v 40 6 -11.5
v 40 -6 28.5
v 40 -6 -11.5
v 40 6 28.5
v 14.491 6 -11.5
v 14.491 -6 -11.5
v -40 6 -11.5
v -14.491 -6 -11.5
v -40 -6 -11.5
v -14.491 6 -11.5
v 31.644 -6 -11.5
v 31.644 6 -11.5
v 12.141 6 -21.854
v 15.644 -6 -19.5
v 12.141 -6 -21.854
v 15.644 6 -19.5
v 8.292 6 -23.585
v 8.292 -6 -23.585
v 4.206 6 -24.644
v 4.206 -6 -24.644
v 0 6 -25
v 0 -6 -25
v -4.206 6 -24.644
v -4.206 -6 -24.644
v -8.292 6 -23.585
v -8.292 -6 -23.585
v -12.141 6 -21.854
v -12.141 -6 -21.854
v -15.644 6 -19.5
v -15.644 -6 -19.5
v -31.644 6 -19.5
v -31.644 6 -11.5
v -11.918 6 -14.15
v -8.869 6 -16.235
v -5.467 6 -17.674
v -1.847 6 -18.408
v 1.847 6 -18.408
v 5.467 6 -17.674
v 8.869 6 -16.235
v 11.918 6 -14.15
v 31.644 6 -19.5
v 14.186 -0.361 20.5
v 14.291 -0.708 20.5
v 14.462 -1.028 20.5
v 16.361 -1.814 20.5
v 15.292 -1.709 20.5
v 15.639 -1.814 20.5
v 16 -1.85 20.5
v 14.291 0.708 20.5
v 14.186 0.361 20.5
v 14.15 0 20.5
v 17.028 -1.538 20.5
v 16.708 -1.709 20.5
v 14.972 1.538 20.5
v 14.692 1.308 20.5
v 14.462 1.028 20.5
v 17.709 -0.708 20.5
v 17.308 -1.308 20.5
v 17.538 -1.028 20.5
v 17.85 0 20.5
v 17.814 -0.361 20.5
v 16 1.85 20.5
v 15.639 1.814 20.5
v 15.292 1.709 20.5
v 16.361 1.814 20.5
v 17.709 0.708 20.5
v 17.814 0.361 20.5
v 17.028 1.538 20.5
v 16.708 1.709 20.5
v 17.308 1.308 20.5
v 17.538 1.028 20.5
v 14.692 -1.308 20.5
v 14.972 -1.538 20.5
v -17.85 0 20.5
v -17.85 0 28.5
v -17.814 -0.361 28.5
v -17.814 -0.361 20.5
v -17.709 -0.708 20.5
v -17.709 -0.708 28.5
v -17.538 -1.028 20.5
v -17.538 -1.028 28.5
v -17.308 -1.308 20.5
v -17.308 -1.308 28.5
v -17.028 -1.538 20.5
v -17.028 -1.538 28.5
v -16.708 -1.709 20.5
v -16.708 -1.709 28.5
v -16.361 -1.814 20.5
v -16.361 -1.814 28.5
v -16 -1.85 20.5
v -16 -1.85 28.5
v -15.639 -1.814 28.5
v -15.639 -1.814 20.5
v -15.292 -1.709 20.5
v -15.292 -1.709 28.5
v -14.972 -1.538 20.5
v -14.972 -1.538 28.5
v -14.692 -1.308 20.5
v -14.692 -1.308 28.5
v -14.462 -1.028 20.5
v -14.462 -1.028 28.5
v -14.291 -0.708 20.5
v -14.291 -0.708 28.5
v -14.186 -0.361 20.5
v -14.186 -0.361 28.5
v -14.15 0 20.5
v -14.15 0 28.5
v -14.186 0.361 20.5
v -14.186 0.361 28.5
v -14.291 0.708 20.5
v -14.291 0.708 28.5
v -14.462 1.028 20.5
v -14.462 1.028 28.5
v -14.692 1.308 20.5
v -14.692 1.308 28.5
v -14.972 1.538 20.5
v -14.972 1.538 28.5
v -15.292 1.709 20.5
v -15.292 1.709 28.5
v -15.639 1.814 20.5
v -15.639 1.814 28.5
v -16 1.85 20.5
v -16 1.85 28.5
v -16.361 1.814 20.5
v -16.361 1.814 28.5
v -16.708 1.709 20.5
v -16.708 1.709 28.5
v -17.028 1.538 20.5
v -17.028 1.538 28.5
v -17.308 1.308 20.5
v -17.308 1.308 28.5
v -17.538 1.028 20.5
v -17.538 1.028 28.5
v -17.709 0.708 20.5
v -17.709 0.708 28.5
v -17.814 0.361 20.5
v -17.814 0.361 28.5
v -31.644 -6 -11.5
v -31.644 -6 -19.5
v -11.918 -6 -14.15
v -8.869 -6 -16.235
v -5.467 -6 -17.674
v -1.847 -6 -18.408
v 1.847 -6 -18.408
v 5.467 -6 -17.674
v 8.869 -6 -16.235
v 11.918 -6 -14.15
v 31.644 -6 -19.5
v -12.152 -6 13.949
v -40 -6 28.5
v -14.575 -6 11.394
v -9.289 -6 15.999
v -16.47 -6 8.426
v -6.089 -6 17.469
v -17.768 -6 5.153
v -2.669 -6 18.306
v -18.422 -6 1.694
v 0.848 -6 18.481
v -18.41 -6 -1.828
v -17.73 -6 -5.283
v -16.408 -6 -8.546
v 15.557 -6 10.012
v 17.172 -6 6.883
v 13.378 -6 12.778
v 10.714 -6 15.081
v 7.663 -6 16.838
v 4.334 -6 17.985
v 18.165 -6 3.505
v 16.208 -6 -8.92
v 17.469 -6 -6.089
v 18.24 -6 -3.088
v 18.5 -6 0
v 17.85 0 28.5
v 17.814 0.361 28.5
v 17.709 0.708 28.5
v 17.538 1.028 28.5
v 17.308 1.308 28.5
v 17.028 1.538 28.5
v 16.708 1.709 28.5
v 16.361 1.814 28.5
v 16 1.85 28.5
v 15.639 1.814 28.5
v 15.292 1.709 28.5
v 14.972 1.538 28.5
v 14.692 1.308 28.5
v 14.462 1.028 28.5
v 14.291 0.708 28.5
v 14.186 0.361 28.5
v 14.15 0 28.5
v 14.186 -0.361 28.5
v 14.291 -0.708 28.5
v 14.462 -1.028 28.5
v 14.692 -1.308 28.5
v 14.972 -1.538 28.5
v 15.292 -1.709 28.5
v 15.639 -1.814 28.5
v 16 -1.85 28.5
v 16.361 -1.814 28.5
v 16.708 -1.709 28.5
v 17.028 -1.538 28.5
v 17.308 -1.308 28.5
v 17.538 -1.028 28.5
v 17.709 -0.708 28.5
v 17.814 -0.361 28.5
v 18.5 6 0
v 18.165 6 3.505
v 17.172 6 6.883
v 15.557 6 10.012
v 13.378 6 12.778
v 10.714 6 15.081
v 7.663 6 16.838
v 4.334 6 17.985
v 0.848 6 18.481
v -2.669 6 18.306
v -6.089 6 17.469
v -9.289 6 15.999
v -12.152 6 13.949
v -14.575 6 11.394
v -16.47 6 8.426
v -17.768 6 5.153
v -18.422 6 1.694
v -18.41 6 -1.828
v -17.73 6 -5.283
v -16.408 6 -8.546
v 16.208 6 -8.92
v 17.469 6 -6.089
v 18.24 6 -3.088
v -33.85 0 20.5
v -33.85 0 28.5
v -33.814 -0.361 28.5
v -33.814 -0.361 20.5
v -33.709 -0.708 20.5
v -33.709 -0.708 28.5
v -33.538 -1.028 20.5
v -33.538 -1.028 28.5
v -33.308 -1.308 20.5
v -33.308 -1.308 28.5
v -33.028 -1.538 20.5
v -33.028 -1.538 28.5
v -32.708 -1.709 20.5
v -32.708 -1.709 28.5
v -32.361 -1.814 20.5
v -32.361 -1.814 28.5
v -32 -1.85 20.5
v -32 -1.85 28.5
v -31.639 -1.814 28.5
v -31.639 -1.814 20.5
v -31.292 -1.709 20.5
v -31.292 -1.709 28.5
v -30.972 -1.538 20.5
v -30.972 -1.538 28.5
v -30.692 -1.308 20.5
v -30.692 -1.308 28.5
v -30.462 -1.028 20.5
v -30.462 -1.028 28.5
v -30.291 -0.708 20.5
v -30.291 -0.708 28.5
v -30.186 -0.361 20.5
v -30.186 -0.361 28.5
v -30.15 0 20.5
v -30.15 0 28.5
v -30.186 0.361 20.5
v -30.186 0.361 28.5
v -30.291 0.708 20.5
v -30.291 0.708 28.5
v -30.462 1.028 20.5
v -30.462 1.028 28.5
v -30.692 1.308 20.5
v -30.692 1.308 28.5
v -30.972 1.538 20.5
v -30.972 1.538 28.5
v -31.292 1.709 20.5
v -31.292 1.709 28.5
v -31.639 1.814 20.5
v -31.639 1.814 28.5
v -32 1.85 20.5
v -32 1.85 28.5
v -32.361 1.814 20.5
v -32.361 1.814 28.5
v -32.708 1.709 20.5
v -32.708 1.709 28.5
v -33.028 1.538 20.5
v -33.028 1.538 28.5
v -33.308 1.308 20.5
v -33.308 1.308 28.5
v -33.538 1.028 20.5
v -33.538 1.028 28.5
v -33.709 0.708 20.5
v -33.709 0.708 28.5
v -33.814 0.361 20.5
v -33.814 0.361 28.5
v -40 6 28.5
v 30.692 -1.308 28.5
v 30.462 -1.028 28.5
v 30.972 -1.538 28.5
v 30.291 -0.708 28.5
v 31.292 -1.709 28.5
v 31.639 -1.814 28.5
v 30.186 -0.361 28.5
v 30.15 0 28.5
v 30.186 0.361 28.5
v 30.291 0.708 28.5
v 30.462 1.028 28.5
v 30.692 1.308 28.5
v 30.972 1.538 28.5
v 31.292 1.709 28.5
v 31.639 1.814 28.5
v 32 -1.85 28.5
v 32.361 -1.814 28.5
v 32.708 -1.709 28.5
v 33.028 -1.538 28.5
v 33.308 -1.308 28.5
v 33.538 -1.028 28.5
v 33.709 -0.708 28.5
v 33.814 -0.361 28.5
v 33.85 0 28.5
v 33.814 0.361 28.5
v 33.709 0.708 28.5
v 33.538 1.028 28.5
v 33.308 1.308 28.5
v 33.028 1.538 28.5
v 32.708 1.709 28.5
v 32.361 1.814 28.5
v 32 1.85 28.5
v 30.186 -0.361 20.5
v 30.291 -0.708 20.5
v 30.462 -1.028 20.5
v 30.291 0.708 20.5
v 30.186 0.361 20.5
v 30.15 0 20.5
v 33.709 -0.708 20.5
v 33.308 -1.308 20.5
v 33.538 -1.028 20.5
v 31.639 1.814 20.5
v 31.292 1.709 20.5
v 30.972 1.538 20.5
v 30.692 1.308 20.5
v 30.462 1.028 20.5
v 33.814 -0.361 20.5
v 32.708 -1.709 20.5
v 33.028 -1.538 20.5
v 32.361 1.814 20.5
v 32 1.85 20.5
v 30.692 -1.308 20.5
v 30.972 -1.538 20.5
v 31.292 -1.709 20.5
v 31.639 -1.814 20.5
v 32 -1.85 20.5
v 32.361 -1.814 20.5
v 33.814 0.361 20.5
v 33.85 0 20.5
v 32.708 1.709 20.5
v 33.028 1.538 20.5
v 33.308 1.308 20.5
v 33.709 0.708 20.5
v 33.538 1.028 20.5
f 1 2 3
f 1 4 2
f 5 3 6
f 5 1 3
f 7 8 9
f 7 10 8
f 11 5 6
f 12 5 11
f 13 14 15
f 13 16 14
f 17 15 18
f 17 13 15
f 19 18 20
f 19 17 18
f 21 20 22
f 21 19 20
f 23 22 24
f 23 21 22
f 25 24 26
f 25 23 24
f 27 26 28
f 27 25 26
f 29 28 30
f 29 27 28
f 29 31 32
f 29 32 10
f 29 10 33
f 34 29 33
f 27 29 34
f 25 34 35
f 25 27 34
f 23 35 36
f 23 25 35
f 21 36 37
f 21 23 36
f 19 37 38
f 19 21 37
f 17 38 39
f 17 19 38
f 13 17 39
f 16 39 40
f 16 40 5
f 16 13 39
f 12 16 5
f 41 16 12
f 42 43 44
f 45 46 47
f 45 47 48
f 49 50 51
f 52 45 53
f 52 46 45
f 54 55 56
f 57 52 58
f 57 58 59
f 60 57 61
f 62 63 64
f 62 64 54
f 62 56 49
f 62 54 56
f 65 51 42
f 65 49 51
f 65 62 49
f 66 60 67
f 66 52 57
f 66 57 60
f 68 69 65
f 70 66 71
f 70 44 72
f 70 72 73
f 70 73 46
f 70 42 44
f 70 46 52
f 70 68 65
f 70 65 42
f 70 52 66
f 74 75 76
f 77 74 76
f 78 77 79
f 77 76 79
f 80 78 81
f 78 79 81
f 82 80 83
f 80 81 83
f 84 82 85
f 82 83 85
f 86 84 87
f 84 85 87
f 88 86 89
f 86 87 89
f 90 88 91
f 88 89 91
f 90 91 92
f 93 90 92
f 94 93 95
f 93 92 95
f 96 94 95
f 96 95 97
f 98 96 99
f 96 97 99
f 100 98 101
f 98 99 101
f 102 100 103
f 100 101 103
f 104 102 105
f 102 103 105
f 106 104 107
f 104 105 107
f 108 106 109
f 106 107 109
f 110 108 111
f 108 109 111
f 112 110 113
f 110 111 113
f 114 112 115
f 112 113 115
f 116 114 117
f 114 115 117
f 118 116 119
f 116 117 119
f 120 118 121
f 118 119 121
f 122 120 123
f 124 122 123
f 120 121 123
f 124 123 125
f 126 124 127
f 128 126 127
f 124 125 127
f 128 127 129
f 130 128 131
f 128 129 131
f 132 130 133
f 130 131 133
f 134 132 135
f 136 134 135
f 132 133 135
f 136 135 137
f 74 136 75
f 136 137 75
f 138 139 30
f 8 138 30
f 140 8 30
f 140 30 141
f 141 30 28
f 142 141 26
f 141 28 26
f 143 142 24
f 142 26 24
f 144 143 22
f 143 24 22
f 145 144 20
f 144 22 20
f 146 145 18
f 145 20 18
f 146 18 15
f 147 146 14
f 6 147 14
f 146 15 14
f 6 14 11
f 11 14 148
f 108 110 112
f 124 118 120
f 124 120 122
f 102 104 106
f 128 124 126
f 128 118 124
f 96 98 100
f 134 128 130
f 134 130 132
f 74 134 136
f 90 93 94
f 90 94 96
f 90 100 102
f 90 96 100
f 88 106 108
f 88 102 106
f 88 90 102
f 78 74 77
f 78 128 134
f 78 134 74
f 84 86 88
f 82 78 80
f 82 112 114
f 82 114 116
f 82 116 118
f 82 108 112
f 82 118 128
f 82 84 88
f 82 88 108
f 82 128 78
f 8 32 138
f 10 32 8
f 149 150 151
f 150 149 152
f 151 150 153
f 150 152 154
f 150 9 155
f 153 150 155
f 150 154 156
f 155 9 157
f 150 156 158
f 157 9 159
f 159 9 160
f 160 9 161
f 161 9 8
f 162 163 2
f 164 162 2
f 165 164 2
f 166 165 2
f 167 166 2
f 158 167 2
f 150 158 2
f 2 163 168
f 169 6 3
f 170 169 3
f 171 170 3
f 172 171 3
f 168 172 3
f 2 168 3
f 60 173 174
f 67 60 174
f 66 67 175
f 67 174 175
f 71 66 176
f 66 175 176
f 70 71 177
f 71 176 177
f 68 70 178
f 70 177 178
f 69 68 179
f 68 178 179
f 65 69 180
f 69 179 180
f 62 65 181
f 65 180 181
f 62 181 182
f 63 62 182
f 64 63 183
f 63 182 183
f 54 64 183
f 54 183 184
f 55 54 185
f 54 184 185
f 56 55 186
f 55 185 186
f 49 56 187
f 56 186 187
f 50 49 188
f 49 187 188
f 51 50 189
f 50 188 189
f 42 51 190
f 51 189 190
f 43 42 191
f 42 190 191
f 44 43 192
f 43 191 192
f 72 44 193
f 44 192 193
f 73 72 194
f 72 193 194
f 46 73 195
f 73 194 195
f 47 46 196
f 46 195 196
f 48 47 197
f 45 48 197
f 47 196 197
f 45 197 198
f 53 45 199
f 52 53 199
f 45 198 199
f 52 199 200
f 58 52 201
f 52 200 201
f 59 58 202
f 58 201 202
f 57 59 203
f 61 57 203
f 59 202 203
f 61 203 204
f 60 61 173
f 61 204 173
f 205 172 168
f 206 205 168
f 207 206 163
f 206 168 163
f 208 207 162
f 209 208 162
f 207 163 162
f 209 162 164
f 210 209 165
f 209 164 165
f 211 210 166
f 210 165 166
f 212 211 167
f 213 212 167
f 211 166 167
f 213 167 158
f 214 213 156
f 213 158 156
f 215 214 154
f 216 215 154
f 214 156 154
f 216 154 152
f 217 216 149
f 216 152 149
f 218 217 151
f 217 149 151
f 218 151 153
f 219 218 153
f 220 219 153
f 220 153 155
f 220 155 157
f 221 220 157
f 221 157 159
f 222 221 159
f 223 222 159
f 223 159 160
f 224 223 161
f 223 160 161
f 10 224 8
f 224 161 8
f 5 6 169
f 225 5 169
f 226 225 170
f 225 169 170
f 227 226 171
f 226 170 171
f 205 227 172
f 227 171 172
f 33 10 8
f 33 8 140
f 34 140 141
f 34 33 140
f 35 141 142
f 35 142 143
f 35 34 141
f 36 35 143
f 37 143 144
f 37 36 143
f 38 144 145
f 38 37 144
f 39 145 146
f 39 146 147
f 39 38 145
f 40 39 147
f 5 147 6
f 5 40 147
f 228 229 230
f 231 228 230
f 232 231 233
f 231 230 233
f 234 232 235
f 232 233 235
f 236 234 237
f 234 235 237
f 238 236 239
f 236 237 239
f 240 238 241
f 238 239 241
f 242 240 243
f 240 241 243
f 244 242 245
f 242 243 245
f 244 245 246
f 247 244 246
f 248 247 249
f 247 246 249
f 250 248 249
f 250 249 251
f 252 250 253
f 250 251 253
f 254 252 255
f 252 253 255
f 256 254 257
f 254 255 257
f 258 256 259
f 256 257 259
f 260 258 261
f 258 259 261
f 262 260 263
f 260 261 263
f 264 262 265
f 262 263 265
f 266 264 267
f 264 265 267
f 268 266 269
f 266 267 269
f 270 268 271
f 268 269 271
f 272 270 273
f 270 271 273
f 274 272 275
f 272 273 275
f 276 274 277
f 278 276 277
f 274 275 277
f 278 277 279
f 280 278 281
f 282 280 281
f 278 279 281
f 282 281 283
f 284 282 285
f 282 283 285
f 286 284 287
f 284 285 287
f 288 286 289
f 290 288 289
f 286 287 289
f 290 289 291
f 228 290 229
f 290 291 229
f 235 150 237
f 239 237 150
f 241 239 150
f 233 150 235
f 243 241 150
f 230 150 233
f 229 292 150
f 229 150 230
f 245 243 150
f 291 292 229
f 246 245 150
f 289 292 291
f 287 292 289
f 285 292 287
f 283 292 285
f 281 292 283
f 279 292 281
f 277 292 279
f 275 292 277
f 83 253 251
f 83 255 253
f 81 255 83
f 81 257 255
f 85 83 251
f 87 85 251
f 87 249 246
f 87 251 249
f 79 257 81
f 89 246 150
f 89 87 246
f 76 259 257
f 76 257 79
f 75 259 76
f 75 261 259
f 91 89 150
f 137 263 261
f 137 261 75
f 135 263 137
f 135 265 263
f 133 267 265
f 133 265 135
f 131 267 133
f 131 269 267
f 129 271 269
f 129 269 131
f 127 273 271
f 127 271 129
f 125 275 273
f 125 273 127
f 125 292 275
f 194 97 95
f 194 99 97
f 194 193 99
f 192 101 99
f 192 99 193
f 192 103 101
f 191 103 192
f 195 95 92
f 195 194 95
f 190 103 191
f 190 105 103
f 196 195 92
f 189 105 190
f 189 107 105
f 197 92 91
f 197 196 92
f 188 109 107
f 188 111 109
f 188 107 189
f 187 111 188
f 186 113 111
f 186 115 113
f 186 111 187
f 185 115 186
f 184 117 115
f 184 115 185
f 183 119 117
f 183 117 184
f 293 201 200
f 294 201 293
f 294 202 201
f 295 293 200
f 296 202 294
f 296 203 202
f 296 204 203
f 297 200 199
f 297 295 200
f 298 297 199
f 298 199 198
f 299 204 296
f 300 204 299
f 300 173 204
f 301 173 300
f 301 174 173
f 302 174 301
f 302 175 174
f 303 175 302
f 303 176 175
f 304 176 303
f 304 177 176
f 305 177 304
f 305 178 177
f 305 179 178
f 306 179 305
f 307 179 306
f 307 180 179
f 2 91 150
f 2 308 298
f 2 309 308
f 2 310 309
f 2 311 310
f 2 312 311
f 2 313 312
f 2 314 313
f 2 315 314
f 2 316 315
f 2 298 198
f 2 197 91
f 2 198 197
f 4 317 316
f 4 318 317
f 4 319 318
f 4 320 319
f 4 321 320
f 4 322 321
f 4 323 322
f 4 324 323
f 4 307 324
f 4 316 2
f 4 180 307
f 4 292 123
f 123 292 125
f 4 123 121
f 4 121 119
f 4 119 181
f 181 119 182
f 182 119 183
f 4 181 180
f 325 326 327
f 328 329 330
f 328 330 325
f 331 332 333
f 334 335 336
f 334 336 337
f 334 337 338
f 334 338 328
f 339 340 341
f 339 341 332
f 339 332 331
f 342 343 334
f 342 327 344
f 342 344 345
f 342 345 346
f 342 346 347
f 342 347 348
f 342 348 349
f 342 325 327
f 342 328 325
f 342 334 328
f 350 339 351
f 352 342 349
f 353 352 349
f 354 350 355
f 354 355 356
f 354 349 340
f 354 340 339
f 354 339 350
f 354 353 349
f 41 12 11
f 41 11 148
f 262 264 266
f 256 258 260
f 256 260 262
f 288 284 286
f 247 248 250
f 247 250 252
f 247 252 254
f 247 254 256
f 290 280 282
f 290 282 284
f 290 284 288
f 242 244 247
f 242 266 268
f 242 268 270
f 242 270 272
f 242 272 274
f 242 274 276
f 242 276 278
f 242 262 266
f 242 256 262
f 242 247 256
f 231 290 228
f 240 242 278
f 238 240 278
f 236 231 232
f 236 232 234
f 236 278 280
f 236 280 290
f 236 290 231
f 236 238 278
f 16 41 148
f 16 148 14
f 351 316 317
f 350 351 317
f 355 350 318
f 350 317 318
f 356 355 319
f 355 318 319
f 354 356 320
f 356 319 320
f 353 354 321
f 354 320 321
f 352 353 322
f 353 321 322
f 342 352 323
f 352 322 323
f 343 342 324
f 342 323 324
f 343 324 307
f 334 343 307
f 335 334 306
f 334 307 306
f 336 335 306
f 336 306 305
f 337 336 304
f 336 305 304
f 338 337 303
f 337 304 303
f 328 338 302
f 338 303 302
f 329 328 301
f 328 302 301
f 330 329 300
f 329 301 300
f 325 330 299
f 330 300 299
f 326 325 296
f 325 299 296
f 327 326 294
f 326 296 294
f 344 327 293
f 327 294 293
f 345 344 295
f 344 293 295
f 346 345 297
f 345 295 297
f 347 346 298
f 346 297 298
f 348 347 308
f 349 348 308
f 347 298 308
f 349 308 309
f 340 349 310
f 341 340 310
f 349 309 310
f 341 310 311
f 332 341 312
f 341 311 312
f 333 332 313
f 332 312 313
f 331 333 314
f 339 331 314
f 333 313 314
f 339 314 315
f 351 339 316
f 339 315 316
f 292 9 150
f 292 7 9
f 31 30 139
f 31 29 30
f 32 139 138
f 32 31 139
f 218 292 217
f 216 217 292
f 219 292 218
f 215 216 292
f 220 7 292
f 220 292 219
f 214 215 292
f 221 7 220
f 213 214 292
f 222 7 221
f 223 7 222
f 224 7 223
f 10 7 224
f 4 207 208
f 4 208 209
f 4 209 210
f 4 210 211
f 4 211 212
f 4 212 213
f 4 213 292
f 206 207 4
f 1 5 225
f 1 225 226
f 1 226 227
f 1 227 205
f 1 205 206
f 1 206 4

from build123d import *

# Parameters (mm, degrees)
MOTOR_MOUNT_DEPTH          = 6
TAPPING_COVER_DEPTH        = 6
SKETCH_2_R                 = 1.85
TAPPING_HOLES_BOTTOM_DEPTH = 8


with BuildPart() as part:
    # 草图1 → motor Mount (new, symmetric)
    with BuildSketch(Plane(origin=(0, 0, 0), x_dir=(1, 0, 0), z_dir=(0, 1, 0))):
        with BuildLine():
            Line((-40, 11.5), (-40, -28.5))
            Line((-40, -28.5), (40, -28.5))
            Line((40, -28.5), (40, 11.5))
            Line((40, 11.5), (31.644487847, 11.5))
            Line((31.644487847, 11.5), (14.491376746, 11.5))
            ThreePointArc((14.491376746, 11.5), (17.469122328, 6.089315651), (18.5, 0))
            ThreePointArc((18.5, 0), (-6.089315651, -17.469122328), (-14.491376746, 11.5))
            Line((-14.491376746, 11.5), (-31.644487847, 11.5))
            Line((-31.644487847, 11.5), (-40, 11.5))
        make_face()
    extrude(amount=MOTOR_MOUNT_DEPTH, both=True)

    # 草图2 → tapping holes_bottom (cut)
    with BuildSketch(Plane.XY.offset(28.5)):
        with Locations((32, 0)):
            Circle(SKETCH_2_R)
        with Locations((16, 0)):
            Circle(SKETCH_2_R)
        with Locations((-16, 0)):
            Circle(SKETCH_2_R)
        with Locations((-32, 0)):
            Circle(SKETCH_2_R)
    extrude(amount=-TAPPING_HOLES_BOTTOM_DEPTH, mode=Mode.SUBTRACT)


with BuildPart() as body_2:
    # 草图1<4> → tapping cover (new, symmetric)
    with BuildSketch(Plane(origin=(0, 0, 0), x_dir=(1, 0, 0), z_dir=(0, 1, 0))):
        with BuildLine():
            Line((-31.644487847, 19.5), (-31.644487847, 11.5))
            Line((-31.644487847, 11.5), (-14.491376746, 11.5))
            ThreePointArc((-14.491376746, 11.5), (0, 18.5), (14.491376746, 11.5))
            Line((14.491376746, 11.5), (31.644487847, 11.5))
            Line((31.644487847, 11.5), (31.644487847, 19.5))
            Line((31.644487847, 19.5), (15.644487847, 19.5))
            ThreePointArc((15.644487847, 19.5), (0, 25), (-15.644487847, 19.5))
            Line((-15.644487847, 19.5), (-31.644487847, 19.5))
        make_face()
    extrude(amount=TAPPING_COVER_DEPTH, both=True)


solid = Compound([part.part, body_2.part])
